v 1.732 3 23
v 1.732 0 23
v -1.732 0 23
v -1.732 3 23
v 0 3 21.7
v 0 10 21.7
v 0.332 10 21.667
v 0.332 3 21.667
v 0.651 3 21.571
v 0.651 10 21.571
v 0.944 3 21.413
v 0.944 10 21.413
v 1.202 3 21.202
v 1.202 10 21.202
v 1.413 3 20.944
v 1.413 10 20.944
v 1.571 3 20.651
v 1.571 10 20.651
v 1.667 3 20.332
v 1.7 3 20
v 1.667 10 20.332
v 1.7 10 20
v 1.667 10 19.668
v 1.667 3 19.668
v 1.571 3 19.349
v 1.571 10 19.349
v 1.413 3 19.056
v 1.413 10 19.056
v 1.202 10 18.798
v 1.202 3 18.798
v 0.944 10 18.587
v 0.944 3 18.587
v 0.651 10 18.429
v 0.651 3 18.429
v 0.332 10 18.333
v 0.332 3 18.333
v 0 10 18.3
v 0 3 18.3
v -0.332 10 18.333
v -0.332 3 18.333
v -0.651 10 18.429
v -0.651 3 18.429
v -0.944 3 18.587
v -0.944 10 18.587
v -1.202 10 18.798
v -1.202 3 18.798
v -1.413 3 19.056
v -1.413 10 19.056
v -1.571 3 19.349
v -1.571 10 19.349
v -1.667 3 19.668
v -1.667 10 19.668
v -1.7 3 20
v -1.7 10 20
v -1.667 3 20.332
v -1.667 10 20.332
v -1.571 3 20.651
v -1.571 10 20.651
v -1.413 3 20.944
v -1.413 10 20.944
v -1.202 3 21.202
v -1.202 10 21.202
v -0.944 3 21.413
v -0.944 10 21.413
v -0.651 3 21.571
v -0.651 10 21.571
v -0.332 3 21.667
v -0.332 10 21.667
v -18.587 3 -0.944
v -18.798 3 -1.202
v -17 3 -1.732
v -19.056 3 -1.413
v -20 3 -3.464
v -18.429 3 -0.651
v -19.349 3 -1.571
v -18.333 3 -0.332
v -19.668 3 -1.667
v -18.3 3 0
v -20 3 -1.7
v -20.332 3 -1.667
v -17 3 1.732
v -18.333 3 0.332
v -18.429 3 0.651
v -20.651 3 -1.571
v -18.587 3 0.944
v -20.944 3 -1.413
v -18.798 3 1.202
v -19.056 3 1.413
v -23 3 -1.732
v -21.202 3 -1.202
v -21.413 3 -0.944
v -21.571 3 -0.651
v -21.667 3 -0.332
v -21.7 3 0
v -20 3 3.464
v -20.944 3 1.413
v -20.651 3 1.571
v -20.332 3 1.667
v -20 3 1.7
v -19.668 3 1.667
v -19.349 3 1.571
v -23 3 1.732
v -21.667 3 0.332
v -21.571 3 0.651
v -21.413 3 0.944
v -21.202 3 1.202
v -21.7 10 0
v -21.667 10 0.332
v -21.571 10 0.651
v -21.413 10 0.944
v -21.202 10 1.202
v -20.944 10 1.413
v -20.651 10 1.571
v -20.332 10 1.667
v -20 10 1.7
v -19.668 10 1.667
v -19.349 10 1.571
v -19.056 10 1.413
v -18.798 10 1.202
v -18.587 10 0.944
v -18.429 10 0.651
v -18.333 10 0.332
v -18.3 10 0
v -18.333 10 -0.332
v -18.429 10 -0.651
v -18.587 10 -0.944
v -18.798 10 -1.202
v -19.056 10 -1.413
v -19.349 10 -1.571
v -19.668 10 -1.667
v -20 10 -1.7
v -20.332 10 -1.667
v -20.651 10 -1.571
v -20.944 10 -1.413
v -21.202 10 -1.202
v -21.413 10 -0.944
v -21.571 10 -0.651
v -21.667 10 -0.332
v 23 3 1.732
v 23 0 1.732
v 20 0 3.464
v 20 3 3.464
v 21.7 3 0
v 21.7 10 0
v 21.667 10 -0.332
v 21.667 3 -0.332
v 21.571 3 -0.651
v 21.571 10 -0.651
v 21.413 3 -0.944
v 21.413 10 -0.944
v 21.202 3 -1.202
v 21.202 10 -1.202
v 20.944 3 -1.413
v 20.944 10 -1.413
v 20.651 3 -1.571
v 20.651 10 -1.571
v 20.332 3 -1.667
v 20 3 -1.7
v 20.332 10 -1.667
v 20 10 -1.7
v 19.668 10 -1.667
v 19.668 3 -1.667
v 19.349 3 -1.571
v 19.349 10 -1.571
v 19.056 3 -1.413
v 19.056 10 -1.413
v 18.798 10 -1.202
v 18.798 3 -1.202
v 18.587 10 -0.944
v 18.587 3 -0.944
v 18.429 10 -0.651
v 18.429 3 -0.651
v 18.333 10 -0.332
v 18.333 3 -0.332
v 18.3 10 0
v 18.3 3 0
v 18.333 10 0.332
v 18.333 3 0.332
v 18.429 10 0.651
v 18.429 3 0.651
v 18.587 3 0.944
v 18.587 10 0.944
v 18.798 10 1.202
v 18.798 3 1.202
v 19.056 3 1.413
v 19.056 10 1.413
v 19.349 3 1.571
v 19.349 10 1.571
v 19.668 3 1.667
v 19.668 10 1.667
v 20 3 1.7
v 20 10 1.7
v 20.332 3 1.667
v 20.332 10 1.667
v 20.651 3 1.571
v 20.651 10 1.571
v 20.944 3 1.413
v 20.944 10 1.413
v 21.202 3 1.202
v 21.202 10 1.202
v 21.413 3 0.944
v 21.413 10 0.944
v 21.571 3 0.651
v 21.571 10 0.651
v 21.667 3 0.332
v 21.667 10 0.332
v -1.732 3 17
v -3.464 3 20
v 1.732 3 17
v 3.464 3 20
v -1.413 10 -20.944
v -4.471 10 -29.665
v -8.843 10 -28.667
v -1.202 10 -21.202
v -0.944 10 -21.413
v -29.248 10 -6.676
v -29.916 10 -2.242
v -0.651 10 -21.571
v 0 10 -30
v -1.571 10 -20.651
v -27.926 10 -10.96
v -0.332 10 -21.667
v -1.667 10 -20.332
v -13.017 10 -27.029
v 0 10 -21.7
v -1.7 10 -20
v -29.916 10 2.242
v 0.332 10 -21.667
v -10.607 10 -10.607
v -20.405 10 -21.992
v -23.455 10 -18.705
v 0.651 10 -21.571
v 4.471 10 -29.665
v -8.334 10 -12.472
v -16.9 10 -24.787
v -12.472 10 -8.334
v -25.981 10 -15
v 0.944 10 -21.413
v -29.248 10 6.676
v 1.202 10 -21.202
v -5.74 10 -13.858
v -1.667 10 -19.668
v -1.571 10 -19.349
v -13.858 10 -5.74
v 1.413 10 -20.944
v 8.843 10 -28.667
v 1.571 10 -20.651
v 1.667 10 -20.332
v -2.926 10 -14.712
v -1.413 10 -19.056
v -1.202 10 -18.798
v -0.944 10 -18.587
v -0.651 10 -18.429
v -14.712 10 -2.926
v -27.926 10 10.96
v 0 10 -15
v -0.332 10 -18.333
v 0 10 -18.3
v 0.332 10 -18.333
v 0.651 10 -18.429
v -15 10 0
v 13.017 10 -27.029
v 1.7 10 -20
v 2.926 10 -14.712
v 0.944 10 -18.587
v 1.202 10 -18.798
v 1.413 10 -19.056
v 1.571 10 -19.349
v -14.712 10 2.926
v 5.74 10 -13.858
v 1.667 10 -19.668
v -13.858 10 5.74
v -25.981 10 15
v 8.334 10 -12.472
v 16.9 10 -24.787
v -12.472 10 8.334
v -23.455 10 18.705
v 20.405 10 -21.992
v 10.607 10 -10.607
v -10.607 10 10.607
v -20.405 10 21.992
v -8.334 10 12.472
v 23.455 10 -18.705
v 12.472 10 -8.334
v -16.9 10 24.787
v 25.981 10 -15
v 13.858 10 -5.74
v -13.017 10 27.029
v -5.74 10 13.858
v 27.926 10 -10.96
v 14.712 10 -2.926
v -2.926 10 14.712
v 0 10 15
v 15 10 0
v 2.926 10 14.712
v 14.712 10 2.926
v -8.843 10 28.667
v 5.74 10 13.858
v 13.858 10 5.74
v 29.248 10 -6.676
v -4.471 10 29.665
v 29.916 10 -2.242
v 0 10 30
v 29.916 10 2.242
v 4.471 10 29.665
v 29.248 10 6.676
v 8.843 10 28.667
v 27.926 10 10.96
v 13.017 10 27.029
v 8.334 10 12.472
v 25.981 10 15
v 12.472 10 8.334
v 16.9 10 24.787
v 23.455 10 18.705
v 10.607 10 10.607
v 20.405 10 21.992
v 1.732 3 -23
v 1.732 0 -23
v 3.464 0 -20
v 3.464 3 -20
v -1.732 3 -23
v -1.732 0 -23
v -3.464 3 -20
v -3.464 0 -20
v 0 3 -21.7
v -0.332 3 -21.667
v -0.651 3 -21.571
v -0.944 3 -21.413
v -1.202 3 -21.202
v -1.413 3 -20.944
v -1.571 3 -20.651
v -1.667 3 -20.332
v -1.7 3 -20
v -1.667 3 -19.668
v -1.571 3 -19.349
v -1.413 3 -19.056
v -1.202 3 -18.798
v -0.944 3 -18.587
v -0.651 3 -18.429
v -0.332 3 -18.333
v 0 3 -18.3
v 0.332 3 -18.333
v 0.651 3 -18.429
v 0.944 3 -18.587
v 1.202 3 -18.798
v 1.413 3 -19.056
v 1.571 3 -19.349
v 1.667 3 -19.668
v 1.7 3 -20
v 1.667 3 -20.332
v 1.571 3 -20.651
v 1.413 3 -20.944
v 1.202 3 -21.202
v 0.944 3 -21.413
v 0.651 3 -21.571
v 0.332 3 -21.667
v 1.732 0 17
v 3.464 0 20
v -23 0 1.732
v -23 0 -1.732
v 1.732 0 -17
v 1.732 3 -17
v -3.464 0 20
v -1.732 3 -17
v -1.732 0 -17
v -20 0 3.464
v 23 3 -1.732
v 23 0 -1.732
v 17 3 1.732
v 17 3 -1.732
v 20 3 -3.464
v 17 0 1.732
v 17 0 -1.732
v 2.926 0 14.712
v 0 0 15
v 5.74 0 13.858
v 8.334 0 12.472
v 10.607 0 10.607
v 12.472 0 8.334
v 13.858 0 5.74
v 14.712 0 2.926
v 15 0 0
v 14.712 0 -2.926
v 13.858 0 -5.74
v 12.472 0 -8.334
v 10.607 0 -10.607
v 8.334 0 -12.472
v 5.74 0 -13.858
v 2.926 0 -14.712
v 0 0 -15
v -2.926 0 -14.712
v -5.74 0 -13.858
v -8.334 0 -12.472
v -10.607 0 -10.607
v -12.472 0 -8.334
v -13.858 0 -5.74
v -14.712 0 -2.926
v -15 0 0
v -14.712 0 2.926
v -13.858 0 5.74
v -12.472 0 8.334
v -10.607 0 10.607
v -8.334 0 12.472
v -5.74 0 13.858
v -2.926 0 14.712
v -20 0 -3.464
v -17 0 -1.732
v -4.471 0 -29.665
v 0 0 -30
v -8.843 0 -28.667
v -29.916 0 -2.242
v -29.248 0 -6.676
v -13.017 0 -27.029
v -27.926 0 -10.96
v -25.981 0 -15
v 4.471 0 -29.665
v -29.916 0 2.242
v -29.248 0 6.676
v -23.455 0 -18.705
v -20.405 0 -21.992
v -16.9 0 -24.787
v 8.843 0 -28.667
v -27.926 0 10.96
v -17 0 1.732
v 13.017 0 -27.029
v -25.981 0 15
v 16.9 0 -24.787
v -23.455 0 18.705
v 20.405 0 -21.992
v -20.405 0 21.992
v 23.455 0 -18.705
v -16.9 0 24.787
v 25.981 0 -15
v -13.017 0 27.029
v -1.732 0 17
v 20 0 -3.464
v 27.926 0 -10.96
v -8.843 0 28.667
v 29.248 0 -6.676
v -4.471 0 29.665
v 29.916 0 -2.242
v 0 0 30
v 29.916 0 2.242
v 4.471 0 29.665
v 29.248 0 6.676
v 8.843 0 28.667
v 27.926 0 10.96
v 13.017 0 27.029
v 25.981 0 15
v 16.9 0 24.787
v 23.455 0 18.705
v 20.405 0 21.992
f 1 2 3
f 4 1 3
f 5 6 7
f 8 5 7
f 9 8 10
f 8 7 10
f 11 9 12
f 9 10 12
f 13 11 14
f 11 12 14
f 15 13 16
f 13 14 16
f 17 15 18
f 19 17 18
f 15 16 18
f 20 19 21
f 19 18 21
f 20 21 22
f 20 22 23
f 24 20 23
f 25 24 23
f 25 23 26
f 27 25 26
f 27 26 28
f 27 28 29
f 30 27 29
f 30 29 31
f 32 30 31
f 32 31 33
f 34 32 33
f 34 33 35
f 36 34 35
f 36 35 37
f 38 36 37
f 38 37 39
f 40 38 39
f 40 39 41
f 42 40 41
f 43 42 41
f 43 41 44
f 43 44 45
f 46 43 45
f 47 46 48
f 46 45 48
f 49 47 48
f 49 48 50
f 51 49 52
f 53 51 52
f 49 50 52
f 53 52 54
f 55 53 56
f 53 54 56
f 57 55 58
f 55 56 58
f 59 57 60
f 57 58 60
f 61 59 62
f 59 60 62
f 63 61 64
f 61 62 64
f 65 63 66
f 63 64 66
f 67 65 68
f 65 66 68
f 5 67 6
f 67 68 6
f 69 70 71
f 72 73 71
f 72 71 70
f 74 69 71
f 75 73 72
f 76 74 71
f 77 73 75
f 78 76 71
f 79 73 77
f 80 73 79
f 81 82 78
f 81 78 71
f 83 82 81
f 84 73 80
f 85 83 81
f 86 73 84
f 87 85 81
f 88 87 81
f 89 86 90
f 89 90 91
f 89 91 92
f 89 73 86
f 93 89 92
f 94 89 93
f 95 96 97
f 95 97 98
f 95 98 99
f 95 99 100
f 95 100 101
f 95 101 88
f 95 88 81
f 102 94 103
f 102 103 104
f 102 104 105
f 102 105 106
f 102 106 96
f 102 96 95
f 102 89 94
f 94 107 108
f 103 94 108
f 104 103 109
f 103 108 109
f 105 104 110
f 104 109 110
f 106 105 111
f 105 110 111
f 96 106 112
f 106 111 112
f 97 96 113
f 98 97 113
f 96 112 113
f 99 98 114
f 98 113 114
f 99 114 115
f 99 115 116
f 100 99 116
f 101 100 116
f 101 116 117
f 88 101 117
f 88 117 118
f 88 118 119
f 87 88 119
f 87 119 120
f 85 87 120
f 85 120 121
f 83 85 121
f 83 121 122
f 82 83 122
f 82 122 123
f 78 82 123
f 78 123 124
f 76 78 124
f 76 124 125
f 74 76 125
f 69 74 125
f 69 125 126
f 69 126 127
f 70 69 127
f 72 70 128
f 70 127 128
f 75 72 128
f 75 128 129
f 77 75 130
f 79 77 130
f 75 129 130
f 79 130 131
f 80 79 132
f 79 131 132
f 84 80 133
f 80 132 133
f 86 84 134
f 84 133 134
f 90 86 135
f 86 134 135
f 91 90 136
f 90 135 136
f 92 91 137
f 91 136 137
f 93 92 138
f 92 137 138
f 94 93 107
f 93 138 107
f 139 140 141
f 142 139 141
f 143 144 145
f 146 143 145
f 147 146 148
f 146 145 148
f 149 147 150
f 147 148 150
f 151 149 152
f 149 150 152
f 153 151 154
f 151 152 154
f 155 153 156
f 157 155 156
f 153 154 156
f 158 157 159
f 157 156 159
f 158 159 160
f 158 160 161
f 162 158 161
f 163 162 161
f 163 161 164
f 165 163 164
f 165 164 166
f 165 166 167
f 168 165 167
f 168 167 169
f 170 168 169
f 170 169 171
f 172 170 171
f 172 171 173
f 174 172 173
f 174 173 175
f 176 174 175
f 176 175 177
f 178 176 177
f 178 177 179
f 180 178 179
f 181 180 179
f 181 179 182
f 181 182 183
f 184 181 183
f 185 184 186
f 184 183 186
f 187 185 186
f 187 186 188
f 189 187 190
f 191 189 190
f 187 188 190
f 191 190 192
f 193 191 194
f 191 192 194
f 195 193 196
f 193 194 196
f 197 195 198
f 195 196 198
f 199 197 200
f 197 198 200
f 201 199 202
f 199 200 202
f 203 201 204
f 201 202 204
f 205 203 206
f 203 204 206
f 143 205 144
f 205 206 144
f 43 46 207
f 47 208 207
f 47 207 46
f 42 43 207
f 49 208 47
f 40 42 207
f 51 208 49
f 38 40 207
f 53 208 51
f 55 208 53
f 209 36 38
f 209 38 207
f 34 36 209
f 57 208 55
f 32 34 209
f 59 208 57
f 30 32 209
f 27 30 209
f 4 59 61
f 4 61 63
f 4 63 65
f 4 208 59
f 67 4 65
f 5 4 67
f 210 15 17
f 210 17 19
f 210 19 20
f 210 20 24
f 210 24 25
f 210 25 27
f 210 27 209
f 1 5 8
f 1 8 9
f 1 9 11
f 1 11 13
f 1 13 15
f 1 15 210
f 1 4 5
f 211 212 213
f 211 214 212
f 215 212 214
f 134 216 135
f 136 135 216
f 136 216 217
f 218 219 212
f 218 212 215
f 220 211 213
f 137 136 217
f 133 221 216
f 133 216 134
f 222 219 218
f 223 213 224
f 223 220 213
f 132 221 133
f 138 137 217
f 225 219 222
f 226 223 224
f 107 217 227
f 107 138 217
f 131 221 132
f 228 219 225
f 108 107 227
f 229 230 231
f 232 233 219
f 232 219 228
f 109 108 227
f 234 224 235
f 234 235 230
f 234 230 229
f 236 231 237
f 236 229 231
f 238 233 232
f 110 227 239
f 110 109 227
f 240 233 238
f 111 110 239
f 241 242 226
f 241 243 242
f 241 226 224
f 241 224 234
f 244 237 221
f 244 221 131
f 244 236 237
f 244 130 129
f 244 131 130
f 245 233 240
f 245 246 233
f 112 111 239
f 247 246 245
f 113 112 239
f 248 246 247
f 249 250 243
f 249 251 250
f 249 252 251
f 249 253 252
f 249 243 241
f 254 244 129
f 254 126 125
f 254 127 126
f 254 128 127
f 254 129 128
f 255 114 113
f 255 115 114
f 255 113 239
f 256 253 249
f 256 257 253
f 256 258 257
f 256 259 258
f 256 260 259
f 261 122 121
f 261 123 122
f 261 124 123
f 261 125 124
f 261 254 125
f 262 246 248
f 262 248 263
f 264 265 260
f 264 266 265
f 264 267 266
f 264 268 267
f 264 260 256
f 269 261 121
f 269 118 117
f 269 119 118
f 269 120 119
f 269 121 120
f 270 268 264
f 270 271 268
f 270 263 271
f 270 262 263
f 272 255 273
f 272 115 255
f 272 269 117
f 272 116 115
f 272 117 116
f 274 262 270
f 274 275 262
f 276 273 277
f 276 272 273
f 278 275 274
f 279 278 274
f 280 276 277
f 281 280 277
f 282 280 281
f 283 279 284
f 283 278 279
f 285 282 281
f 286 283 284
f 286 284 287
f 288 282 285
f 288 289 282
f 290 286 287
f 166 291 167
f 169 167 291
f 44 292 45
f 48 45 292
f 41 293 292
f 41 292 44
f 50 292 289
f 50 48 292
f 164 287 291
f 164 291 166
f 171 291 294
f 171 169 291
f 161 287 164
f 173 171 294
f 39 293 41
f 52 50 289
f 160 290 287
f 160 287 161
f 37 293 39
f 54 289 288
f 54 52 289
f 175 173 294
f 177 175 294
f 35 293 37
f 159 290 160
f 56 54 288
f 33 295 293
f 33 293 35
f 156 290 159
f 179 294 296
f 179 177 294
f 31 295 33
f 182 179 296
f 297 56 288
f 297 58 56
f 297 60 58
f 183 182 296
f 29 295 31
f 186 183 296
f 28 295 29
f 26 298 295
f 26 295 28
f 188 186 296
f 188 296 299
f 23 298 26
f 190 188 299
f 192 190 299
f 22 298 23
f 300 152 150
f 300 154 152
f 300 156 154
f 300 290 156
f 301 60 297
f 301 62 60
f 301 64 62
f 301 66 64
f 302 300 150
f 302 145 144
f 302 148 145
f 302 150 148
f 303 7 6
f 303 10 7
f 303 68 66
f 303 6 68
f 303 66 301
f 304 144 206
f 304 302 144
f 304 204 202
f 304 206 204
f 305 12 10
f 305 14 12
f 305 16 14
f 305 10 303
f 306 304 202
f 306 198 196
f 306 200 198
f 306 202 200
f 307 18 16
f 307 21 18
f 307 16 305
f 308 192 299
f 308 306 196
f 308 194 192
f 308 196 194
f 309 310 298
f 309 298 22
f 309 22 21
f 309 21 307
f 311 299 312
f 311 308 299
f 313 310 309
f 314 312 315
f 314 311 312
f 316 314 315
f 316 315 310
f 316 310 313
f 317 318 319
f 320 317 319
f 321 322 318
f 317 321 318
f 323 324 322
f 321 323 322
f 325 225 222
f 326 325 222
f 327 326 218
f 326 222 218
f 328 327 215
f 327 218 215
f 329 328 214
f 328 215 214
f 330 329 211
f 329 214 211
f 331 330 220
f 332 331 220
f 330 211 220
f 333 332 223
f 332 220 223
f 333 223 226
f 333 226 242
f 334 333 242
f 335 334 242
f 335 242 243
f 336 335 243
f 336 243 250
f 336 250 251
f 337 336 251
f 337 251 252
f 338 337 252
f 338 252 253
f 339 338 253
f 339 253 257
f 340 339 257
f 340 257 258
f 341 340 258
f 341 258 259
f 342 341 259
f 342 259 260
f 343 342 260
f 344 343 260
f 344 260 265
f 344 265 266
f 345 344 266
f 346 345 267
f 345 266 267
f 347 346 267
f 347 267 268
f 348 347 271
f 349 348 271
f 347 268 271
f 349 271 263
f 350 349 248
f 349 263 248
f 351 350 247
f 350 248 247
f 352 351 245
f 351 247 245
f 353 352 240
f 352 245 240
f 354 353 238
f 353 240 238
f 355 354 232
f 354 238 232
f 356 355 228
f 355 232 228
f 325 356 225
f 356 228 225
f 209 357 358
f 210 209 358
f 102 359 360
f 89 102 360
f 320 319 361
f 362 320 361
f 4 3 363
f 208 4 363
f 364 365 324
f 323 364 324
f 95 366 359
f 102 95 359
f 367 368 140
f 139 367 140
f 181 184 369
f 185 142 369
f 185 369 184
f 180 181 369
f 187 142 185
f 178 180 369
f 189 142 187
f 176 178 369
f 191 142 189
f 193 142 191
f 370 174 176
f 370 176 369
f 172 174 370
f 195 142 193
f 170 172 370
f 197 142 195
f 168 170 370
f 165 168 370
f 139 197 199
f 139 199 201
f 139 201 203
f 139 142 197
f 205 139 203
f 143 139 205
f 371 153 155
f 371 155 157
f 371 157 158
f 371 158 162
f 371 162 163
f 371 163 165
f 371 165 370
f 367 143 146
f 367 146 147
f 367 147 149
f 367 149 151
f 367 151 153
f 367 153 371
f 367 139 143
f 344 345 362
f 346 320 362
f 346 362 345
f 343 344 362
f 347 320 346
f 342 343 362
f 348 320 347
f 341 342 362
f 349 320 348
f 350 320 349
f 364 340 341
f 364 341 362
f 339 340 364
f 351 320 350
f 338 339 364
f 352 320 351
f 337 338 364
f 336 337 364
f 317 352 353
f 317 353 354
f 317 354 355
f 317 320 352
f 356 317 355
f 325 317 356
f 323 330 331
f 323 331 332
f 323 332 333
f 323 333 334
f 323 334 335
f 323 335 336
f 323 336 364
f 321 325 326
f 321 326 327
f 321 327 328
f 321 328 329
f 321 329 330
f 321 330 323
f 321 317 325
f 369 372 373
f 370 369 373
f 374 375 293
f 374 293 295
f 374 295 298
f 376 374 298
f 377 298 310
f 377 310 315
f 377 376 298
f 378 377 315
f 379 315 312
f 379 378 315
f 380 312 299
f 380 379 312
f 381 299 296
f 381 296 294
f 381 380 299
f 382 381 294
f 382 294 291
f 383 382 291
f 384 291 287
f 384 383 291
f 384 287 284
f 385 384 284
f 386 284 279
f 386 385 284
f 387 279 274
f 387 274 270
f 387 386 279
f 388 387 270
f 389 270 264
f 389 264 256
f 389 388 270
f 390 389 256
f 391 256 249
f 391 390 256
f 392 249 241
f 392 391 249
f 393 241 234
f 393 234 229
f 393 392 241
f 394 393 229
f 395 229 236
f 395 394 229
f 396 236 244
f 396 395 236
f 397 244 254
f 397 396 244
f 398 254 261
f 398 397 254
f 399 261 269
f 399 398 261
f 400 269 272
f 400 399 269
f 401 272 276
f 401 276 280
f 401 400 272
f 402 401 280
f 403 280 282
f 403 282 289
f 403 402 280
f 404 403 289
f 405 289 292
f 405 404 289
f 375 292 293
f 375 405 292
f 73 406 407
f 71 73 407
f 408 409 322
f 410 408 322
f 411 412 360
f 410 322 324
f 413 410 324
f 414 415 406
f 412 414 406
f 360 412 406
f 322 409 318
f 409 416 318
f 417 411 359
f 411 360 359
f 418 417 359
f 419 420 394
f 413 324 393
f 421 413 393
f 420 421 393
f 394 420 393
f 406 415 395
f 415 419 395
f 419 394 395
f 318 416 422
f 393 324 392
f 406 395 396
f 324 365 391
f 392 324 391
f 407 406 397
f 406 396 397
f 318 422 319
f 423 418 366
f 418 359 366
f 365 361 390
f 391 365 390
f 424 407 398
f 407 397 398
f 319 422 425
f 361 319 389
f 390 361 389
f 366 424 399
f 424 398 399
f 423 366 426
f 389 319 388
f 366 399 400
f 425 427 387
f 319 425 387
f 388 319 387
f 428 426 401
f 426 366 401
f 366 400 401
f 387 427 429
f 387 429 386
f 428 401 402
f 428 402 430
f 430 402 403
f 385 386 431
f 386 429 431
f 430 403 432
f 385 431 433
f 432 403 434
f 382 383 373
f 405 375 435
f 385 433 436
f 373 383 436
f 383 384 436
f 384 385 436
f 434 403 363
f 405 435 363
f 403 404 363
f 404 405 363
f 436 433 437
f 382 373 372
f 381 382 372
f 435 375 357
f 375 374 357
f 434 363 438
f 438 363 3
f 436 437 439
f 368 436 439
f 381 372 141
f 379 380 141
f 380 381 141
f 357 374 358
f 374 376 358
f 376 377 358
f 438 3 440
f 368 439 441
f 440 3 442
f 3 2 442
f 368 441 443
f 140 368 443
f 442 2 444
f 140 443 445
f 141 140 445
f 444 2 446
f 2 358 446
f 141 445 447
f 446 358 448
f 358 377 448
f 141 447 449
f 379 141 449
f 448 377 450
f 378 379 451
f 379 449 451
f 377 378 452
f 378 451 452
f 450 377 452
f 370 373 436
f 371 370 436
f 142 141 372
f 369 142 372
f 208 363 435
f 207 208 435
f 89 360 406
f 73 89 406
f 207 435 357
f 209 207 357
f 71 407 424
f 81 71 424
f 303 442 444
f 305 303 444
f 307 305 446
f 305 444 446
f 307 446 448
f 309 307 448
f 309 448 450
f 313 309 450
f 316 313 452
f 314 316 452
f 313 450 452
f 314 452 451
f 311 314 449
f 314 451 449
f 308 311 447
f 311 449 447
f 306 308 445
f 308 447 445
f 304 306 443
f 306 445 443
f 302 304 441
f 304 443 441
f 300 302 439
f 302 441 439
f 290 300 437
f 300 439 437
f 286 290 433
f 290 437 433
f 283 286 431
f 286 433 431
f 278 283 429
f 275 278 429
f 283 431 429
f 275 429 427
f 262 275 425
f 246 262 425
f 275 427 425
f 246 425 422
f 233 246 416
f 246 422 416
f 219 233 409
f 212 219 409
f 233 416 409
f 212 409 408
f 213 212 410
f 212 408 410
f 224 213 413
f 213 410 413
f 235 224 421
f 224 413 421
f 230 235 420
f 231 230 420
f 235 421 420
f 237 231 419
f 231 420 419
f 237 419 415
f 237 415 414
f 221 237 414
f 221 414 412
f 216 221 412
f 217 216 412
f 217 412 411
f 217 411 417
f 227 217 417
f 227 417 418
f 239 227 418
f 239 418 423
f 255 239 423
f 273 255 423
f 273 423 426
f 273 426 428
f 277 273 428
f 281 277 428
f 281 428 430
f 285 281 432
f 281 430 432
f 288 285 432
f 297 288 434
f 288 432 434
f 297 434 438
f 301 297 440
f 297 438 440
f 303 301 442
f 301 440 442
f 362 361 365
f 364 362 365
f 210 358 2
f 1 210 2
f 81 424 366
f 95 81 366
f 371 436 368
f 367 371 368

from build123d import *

# Parameters (mm, degrees)
SKETCH1_R           = 30
SKETCH1_R_2         = 15
BOSS_EXTRUDE1_DEPTH = 10
SKETCH2_R           = 1.7
CUT_EXTRUDE1_DEPTH  = 44.588989435
CUT_EXTRUDE2_DEPTH  = 3
CIRPATTERN1_COUNT   = 4


with BuildPart() as part:
    # Sketch1 → Boss-Extrude1 (new body)
    with BuildSketch(Plane(origin=(0, 0, 0), x_dir=(1, 0, 0), z_dir=(0, 1, 0))):
        with Locations(Location((0, 0, 0), (0, 0, 270))):
            Circle(SKETCH1_R)
        with Locations(Location((0, 0, 0), (0, 0, 270))):
            Circle(SKETCH1_R_2, mode=Mode.SUBTRACT)
    extrude(amount=BOSS_EXTRUDE1_DEPTH)

    # Sketch2 → Cut-Extrude1 (cut, through all)
    with BuildSketch(Plane(origin=(0, 10, 0), x_dir=(1, 0, 0), z_dir=(0, 1, 0))):
        with Locations(Location((0, -20, 0), (0, 0, 270))):
            Circle(SKETCH2_R)
    cut_extrude1 = extrude(amount=-CUT_EXTRUDE1_DEPTH, mode=Mode.SUBTRACT)

    # Sketch3 → Cut-Extrude2 (cut)
    with BuildSketch(Plane.XZ):
        Polygon((3.464101615, 20), (1.732050808, 23), (-1.732050808, 23), (-3.464101615, 20), (-1.732050808, 17), (1.732050808, 17), align=None)
    cut_extrude2 = extrude(amount=-CUT_EXTRUDE2_DEPTH, mode=Mode.SUBTRACT)

    # CirPattern1: Cut-Extrude1, Cut-Extrude2 ×4 about axis
    cirpattern1_axis = Axis((0, 0, 0), (0, 1, 0))
    add([cut_extrude1.rotate(cirpattern1_axis, i * 360 / CIRPATTERN1_COUNT) for i in range(1, CIRPATTERN1_COUNT)], mode=Mode.SUBTRACT)
    add([cut_extrude2.rotate(cirpattern1_axis, i * 360 / CIRPATTERN1_COUNT) for i in range(1, CIRPATTERN1_COUNT)], mode=Mode.SUBTRACT)


solid = part.part
